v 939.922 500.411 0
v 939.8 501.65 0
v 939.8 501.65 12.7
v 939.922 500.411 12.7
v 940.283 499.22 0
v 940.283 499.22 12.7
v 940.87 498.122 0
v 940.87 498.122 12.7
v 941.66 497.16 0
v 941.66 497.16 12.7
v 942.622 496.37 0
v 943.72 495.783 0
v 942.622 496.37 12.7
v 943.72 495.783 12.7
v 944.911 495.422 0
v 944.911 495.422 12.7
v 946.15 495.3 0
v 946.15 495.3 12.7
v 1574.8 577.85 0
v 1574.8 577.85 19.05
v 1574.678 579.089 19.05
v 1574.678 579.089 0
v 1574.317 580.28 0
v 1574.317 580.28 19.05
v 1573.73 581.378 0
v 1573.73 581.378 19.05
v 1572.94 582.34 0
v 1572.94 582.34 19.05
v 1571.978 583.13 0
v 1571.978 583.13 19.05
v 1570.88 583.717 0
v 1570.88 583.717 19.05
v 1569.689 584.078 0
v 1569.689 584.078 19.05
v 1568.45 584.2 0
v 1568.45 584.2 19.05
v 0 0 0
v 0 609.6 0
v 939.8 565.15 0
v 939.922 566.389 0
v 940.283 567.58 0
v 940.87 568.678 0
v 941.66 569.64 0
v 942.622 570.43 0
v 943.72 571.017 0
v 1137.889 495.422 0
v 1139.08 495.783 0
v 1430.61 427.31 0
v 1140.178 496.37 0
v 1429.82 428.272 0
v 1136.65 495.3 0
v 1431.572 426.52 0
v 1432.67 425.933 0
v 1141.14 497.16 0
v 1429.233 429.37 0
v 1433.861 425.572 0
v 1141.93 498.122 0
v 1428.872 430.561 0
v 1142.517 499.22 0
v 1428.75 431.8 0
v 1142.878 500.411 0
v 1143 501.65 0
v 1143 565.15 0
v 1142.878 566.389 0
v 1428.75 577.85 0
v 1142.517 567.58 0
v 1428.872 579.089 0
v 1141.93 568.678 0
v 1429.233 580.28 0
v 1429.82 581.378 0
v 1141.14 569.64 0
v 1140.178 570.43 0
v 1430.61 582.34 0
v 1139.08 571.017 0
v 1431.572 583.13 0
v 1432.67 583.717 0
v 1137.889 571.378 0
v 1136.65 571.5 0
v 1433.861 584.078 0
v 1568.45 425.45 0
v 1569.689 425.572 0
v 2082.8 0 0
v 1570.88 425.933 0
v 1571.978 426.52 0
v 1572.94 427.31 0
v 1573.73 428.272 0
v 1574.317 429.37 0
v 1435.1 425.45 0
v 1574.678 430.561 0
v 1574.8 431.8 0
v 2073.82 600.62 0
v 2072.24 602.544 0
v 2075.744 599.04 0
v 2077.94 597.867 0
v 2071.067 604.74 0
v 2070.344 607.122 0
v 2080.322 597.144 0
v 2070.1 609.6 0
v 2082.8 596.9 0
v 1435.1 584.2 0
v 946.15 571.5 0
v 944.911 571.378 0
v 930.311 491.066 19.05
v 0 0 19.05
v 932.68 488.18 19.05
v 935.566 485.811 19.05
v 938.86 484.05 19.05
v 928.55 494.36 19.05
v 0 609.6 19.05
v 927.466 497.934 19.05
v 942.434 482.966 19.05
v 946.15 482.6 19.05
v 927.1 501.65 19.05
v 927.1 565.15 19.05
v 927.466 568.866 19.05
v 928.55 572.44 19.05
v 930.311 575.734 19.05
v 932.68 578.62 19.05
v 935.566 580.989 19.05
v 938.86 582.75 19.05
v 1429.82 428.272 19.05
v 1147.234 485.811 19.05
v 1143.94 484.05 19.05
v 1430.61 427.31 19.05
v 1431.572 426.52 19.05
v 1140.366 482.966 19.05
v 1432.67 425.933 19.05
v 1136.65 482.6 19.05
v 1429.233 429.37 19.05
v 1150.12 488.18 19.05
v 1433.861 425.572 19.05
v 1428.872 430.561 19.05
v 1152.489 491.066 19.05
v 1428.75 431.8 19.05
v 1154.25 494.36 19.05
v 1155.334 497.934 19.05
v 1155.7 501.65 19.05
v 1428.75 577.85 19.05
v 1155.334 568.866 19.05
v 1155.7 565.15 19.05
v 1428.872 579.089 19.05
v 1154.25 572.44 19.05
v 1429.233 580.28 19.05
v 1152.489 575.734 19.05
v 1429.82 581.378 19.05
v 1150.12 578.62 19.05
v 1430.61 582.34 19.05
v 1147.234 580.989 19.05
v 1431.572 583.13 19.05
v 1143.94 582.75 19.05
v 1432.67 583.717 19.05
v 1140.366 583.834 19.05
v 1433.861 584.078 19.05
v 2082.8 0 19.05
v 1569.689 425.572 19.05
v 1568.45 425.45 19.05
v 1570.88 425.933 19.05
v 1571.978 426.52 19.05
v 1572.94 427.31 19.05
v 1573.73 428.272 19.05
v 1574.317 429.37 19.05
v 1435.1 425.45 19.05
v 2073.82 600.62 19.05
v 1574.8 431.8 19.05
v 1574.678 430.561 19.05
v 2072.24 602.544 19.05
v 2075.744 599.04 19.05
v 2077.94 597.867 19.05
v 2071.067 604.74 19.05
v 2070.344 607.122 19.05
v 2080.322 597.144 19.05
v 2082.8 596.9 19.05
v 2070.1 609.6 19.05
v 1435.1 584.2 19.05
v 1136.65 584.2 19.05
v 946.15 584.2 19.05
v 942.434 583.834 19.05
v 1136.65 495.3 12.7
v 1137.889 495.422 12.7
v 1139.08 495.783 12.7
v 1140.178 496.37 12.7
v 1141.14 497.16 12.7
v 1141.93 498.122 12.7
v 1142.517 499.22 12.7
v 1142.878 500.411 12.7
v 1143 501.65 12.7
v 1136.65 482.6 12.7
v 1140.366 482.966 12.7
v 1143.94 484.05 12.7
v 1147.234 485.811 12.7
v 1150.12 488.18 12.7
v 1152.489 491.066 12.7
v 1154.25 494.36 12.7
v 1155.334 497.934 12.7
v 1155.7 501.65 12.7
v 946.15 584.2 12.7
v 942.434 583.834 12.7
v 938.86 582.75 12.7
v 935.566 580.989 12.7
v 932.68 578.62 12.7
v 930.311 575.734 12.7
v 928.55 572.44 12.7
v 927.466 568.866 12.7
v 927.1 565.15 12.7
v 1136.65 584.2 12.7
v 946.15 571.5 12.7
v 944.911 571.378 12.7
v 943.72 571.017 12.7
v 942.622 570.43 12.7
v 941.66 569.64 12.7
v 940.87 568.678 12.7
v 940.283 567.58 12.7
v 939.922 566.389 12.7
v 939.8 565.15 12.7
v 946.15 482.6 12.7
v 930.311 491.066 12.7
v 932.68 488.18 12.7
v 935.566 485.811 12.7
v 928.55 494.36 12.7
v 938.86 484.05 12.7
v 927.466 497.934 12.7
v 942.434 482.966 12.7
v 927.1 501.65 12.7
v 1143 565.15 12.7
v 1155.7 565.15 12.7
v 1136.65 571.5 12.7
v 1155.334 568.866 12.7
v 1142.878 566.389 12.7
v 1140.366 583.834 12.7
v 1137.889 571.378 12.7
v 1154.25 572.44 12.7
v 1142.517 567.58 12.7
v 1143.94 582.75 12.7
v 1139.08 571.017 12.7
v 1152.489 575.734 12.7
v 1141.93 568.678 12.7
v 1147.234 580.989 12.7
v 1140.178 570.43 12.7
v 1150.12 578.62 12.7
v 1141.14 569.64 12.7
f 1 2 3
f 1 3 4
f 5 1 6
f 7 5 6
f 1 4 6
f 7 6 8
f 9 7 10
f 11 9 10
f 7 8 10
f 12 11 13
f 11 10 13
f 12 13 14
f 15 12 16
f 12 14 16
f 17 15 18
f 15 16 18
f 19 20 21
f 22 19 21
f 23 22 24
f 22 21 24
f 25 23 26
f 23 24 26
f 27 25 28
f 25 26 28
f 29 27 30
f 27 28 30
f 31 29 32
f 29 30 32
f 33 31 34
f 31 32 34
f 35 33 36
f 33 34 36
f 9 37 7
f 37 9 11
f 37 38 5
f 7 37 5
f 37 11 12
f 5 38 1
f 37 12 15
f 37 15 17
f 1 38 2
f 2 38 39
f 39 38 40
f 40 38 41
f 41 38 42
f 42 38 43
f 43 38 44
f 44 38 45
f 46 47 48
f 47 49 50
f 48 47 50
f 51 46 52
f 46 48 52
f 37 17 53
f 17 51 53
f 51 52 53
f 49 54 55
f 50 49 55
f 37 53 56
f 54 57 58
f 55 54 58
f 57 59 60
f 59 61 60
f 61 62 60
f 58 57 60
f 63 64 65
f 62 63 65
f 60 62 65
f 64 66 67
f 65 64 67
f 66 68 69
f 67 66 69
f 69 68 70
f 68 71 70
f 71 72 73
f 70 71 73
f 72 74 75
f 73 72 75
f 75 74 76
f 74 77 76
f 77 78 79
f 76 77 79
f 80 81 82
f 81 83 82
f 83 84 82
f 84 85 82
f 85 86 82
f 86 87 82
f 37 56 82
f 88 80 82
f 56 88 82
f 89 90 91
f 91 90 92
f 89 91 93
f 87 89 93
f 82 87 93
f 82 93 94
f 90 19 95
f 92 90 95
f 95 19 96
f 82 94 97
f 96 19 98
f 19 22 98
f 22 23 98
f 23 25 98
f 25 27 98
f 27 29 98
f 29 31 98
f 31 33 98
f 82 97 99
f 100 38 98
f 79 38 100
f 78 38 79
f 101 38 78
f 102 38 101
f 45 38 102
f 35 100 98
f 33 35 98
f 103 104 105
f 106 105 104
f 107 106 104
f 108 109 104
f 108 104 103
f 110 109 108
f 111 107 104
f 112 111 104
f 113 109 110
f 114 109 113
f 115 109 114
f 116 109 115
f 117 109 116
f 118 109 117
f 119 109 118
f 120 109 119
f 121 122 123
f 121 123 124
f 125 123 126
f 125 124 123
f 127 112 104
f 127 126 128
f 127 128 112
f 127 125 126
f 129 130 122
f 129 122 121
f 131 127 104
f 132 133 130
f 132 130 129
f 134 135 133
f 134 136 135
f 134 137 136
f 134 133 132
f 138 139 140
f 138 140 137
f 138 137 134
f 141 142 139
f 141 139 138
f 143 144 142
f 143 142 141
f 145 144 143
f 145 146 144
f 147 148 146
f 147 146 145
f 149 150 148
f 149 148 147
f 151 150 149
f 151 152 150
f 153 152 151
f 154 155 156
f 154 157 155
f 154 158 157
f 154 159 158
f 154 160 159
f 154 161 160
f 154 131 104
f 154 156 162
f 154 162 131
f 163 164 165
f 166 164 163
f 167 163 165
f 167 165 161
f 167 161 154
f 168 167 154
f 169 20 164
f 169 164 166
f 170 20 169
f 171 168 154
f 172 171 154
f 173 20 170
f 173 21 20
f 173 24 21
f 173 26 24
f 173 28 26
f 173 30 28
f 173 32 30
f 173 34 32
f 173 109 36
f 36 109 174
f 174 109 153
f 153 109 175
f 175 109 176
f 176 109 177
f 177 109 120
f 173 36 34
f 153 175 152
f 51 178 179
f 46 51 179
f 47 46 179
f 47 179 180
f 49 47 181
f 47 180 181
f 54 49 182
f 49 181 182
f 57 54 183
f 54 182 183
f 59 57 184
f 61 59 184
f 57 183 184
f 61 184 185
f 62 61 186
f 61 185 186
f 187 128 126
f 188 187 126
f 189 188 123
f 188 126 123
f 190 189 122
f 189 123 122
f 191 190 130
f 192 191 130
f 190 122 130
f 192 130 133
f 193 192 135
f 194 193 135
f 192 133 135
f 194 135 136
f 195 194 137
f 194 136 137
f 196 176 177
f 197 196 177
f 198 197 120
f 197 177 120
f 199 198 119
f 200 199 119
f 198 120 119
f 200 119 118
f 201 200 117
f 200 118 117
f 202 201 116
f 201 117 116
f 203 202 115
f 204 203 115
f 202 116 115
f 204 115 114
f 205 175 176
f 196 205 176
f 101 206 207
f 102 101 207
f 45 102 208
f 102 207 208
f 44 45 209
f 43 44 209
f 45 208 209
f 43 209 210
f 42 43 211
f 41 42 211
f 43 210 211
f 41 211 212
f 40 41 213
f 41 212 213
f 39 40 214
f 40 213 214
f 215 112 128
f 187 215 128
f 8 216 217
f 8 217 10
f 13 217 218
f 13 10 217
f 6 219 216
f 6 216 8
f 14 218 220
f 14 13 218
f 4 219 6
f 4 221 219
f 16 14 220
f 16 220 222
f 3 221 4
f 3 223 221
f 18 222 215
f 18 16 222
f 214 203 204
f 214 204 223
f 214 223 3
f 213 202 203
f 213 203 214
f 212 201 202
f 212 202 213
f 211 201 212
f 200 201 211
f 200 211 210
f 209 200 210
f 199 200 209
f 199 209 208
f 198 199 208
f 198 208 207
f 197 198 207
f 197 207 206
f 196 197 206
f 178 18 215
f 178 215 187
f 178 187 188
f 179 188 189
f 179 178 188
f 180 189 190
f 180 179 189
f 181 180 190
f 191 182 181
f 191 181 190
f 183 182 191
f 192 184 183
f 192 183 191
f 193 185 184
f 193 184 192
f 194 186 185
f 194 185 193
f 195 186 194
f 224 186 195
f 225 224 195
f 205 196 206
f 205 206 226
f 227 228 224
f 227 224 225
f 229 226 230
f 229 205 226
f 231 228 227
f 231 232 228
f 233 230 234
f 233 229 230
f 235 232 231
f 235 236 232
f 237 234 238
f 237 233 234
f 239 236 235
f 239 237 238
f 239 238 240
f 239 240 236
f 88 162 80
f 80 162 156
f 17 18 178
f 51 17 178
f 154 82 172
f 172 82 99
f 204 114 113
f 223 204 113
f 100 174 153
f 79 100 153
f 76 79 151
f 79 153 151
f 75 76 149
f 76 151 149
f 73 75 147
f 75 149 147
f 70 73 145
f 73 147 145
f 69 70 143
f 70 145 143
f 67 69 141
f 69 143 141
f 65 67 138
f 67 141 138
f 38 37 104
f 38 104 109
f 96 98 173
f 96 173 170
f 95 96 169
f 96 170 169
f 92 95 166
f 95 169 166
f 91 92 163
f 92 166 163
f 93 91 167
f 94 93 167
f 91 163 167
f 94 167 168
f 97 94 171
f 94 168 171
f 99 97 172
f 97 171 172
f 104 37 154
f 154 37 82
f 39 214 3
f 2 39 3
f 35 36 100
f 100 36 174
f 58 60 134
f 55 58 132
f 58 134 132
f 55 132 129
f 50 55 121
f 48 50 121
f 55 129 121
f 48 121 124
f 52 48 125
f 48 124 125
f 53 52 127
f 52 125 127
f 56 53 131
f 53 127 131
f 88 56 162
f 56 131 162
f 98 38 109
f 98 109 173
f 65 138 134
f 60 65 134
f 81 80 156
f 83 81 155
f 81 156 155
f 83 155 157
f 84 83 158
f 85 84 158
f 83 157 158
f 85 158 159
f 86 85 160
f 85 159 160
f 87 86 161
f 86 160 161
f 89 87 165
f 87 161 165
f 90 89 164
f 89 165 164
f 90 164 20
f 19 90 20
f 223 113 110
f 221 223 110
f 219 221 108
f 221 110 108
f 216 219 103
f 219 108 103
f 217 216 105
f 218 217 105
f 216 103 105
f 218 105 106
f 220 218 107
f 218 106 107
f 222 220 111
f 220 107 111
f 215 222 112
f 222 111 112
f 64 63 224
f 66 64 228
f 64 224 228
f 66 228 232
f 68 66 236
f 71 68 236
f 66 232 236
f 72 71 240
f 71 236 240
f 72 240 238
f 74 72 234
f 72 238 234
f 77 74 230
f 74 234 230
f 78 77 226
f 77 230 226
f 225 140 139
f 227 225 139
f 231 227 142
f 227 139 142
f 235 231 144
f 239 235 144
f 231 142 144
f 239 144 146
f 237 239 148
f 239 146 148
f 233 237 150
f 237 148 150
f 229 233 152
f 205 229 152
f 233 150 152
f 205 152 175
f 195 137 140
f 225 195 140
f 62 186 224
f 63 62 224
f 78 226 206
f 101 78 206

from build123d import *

# Parameters (mm, degrees)
F0_W     = 2082.8
F0_H     = 609.6
F1_DEPTH = 19.05
F2_R     = 12.7
F3_DEPTH = 25.4
F5_DEPTH = 6.35


with BuildPart() as f1:
    # F0 (on Top) → F1 (new body)
    with BuildSketch(Plane.XY):
        with Locations((1041.4, 304.8)):
            Rectangle(F0_W, F0_H)
    extrude(amount=F1_DEPTH)

    # F2 (on face) → F3 (cut)
    with BuildSketch(Plane.XY.offset(19.05)):
        with BuildLine():
            Line((1568.45, 584.2), (1435.1, 584.2))
            ThreePointArc((1435.1, 584.2), (1430.609872, 582.340128), (1428.75, 577.85))
            Line((1428.75, 577.85), (1428.75, 431.8))
            ThreePointArc((1428.75, 431.8), (1430.609872, 427.309872), (1435.1, 425.45))
            Line((1435.1, 425.45), (1568.45, 425.45))
            ThreePointArc((1568.45, 425.45), (1572.940128, 427.309872), (1574.8, 431.8))
            Line((1574.8, 431.8), (1574.8, 577.85))
            ThreePointArc((1574.8, 577.85), (1572.940128, 582.340128), (1568.45, 584.2))
        make_face()
        with BuildLine():
            Line((1136.65, 571.5), (946.15, 571.5))
            ThreePointArc((946.15, 571.5), (941.659872, 569.640128), (939.8, 565.15))
            Line((939.8, 565.15), (939.8, 501.65))
            ThreePointArc((939.8, 501.65), (941.659872, 497.159872), (946.15, 495.3))
            Line((946.15, 495.3), (1136.65, 495.3))
            ThreePointArc((1136.65, 495.3), (1141.140128, 497.159872), (1143, 501.65))
            Line((1143, 501.65), (1143, 565.15))
            ThreePointArc((1143, 565.15), (1141.140128, 569.640128), (1136.65, 571.5))
        make_face()
        with Locations((2082.8, 609.6)):
            Circle(F2_R)
    extrude(amount=-F3_DEPTH, mode=Mode.SUBTRACT)

    # F4 (on face) → F5 (cut)
    with BuildSketch(Plane.XY.offset(19.05)):
        with BuildLine():
            Line((1136.65, 584.2), (946.15, 584.2))
            ThreePointArc((946.15, 584.2), (932.679616, 578.620384), (927.1, 565.15))
            Line((927.1, 565.15), (927.1, 501.65))
            ThreePointArc((927.1, 501.65), (932.679616, 488.179616), (946.15, 482.6))
            Line((946.15, 482.6), (1136.65, 482.6))
            ThreePointArc((1136.65, 482.6), (1150.120384, 488.179616), (1155.7, 501.65))
            Line((1155.7, 501.65), (1155.7, 565.15))
            ThreePointArc((1155.7, 565.15), (1150.120384, 578.620384), (1136.65, 584.2))
        make_face()
        with BuildLine():
            ThreePointArc((1136.65, 571.5), (1141.140128, 569.640128), (1143, 565.15))
            Line((1143, 565.15), (1143, 501.65))
            ThreePointArc((1143, 501.65), (1141.140128, 497.159872), (1136.65, 495.3))
            Line((1136.65, 495.3), (946.15, 495.3))
            ThreePointArc((946.15, 495.3), (941.659872, 497.159872), (939.8, 501.65))
            Line((939.8, 501.65), (939.8, 565.15))
            ThreePointArc((939.8, 565.15), (941.659872, 569.640128), (946.15, 571.5))
            Line((946.15, 571.5), (1136.65, 571.5))
        make_face(mode=Mode.SUBTRACT)
    extrude(amount=-F5_DEPTH, mode=Mode.SUBTRACT)


solid = f1.part
